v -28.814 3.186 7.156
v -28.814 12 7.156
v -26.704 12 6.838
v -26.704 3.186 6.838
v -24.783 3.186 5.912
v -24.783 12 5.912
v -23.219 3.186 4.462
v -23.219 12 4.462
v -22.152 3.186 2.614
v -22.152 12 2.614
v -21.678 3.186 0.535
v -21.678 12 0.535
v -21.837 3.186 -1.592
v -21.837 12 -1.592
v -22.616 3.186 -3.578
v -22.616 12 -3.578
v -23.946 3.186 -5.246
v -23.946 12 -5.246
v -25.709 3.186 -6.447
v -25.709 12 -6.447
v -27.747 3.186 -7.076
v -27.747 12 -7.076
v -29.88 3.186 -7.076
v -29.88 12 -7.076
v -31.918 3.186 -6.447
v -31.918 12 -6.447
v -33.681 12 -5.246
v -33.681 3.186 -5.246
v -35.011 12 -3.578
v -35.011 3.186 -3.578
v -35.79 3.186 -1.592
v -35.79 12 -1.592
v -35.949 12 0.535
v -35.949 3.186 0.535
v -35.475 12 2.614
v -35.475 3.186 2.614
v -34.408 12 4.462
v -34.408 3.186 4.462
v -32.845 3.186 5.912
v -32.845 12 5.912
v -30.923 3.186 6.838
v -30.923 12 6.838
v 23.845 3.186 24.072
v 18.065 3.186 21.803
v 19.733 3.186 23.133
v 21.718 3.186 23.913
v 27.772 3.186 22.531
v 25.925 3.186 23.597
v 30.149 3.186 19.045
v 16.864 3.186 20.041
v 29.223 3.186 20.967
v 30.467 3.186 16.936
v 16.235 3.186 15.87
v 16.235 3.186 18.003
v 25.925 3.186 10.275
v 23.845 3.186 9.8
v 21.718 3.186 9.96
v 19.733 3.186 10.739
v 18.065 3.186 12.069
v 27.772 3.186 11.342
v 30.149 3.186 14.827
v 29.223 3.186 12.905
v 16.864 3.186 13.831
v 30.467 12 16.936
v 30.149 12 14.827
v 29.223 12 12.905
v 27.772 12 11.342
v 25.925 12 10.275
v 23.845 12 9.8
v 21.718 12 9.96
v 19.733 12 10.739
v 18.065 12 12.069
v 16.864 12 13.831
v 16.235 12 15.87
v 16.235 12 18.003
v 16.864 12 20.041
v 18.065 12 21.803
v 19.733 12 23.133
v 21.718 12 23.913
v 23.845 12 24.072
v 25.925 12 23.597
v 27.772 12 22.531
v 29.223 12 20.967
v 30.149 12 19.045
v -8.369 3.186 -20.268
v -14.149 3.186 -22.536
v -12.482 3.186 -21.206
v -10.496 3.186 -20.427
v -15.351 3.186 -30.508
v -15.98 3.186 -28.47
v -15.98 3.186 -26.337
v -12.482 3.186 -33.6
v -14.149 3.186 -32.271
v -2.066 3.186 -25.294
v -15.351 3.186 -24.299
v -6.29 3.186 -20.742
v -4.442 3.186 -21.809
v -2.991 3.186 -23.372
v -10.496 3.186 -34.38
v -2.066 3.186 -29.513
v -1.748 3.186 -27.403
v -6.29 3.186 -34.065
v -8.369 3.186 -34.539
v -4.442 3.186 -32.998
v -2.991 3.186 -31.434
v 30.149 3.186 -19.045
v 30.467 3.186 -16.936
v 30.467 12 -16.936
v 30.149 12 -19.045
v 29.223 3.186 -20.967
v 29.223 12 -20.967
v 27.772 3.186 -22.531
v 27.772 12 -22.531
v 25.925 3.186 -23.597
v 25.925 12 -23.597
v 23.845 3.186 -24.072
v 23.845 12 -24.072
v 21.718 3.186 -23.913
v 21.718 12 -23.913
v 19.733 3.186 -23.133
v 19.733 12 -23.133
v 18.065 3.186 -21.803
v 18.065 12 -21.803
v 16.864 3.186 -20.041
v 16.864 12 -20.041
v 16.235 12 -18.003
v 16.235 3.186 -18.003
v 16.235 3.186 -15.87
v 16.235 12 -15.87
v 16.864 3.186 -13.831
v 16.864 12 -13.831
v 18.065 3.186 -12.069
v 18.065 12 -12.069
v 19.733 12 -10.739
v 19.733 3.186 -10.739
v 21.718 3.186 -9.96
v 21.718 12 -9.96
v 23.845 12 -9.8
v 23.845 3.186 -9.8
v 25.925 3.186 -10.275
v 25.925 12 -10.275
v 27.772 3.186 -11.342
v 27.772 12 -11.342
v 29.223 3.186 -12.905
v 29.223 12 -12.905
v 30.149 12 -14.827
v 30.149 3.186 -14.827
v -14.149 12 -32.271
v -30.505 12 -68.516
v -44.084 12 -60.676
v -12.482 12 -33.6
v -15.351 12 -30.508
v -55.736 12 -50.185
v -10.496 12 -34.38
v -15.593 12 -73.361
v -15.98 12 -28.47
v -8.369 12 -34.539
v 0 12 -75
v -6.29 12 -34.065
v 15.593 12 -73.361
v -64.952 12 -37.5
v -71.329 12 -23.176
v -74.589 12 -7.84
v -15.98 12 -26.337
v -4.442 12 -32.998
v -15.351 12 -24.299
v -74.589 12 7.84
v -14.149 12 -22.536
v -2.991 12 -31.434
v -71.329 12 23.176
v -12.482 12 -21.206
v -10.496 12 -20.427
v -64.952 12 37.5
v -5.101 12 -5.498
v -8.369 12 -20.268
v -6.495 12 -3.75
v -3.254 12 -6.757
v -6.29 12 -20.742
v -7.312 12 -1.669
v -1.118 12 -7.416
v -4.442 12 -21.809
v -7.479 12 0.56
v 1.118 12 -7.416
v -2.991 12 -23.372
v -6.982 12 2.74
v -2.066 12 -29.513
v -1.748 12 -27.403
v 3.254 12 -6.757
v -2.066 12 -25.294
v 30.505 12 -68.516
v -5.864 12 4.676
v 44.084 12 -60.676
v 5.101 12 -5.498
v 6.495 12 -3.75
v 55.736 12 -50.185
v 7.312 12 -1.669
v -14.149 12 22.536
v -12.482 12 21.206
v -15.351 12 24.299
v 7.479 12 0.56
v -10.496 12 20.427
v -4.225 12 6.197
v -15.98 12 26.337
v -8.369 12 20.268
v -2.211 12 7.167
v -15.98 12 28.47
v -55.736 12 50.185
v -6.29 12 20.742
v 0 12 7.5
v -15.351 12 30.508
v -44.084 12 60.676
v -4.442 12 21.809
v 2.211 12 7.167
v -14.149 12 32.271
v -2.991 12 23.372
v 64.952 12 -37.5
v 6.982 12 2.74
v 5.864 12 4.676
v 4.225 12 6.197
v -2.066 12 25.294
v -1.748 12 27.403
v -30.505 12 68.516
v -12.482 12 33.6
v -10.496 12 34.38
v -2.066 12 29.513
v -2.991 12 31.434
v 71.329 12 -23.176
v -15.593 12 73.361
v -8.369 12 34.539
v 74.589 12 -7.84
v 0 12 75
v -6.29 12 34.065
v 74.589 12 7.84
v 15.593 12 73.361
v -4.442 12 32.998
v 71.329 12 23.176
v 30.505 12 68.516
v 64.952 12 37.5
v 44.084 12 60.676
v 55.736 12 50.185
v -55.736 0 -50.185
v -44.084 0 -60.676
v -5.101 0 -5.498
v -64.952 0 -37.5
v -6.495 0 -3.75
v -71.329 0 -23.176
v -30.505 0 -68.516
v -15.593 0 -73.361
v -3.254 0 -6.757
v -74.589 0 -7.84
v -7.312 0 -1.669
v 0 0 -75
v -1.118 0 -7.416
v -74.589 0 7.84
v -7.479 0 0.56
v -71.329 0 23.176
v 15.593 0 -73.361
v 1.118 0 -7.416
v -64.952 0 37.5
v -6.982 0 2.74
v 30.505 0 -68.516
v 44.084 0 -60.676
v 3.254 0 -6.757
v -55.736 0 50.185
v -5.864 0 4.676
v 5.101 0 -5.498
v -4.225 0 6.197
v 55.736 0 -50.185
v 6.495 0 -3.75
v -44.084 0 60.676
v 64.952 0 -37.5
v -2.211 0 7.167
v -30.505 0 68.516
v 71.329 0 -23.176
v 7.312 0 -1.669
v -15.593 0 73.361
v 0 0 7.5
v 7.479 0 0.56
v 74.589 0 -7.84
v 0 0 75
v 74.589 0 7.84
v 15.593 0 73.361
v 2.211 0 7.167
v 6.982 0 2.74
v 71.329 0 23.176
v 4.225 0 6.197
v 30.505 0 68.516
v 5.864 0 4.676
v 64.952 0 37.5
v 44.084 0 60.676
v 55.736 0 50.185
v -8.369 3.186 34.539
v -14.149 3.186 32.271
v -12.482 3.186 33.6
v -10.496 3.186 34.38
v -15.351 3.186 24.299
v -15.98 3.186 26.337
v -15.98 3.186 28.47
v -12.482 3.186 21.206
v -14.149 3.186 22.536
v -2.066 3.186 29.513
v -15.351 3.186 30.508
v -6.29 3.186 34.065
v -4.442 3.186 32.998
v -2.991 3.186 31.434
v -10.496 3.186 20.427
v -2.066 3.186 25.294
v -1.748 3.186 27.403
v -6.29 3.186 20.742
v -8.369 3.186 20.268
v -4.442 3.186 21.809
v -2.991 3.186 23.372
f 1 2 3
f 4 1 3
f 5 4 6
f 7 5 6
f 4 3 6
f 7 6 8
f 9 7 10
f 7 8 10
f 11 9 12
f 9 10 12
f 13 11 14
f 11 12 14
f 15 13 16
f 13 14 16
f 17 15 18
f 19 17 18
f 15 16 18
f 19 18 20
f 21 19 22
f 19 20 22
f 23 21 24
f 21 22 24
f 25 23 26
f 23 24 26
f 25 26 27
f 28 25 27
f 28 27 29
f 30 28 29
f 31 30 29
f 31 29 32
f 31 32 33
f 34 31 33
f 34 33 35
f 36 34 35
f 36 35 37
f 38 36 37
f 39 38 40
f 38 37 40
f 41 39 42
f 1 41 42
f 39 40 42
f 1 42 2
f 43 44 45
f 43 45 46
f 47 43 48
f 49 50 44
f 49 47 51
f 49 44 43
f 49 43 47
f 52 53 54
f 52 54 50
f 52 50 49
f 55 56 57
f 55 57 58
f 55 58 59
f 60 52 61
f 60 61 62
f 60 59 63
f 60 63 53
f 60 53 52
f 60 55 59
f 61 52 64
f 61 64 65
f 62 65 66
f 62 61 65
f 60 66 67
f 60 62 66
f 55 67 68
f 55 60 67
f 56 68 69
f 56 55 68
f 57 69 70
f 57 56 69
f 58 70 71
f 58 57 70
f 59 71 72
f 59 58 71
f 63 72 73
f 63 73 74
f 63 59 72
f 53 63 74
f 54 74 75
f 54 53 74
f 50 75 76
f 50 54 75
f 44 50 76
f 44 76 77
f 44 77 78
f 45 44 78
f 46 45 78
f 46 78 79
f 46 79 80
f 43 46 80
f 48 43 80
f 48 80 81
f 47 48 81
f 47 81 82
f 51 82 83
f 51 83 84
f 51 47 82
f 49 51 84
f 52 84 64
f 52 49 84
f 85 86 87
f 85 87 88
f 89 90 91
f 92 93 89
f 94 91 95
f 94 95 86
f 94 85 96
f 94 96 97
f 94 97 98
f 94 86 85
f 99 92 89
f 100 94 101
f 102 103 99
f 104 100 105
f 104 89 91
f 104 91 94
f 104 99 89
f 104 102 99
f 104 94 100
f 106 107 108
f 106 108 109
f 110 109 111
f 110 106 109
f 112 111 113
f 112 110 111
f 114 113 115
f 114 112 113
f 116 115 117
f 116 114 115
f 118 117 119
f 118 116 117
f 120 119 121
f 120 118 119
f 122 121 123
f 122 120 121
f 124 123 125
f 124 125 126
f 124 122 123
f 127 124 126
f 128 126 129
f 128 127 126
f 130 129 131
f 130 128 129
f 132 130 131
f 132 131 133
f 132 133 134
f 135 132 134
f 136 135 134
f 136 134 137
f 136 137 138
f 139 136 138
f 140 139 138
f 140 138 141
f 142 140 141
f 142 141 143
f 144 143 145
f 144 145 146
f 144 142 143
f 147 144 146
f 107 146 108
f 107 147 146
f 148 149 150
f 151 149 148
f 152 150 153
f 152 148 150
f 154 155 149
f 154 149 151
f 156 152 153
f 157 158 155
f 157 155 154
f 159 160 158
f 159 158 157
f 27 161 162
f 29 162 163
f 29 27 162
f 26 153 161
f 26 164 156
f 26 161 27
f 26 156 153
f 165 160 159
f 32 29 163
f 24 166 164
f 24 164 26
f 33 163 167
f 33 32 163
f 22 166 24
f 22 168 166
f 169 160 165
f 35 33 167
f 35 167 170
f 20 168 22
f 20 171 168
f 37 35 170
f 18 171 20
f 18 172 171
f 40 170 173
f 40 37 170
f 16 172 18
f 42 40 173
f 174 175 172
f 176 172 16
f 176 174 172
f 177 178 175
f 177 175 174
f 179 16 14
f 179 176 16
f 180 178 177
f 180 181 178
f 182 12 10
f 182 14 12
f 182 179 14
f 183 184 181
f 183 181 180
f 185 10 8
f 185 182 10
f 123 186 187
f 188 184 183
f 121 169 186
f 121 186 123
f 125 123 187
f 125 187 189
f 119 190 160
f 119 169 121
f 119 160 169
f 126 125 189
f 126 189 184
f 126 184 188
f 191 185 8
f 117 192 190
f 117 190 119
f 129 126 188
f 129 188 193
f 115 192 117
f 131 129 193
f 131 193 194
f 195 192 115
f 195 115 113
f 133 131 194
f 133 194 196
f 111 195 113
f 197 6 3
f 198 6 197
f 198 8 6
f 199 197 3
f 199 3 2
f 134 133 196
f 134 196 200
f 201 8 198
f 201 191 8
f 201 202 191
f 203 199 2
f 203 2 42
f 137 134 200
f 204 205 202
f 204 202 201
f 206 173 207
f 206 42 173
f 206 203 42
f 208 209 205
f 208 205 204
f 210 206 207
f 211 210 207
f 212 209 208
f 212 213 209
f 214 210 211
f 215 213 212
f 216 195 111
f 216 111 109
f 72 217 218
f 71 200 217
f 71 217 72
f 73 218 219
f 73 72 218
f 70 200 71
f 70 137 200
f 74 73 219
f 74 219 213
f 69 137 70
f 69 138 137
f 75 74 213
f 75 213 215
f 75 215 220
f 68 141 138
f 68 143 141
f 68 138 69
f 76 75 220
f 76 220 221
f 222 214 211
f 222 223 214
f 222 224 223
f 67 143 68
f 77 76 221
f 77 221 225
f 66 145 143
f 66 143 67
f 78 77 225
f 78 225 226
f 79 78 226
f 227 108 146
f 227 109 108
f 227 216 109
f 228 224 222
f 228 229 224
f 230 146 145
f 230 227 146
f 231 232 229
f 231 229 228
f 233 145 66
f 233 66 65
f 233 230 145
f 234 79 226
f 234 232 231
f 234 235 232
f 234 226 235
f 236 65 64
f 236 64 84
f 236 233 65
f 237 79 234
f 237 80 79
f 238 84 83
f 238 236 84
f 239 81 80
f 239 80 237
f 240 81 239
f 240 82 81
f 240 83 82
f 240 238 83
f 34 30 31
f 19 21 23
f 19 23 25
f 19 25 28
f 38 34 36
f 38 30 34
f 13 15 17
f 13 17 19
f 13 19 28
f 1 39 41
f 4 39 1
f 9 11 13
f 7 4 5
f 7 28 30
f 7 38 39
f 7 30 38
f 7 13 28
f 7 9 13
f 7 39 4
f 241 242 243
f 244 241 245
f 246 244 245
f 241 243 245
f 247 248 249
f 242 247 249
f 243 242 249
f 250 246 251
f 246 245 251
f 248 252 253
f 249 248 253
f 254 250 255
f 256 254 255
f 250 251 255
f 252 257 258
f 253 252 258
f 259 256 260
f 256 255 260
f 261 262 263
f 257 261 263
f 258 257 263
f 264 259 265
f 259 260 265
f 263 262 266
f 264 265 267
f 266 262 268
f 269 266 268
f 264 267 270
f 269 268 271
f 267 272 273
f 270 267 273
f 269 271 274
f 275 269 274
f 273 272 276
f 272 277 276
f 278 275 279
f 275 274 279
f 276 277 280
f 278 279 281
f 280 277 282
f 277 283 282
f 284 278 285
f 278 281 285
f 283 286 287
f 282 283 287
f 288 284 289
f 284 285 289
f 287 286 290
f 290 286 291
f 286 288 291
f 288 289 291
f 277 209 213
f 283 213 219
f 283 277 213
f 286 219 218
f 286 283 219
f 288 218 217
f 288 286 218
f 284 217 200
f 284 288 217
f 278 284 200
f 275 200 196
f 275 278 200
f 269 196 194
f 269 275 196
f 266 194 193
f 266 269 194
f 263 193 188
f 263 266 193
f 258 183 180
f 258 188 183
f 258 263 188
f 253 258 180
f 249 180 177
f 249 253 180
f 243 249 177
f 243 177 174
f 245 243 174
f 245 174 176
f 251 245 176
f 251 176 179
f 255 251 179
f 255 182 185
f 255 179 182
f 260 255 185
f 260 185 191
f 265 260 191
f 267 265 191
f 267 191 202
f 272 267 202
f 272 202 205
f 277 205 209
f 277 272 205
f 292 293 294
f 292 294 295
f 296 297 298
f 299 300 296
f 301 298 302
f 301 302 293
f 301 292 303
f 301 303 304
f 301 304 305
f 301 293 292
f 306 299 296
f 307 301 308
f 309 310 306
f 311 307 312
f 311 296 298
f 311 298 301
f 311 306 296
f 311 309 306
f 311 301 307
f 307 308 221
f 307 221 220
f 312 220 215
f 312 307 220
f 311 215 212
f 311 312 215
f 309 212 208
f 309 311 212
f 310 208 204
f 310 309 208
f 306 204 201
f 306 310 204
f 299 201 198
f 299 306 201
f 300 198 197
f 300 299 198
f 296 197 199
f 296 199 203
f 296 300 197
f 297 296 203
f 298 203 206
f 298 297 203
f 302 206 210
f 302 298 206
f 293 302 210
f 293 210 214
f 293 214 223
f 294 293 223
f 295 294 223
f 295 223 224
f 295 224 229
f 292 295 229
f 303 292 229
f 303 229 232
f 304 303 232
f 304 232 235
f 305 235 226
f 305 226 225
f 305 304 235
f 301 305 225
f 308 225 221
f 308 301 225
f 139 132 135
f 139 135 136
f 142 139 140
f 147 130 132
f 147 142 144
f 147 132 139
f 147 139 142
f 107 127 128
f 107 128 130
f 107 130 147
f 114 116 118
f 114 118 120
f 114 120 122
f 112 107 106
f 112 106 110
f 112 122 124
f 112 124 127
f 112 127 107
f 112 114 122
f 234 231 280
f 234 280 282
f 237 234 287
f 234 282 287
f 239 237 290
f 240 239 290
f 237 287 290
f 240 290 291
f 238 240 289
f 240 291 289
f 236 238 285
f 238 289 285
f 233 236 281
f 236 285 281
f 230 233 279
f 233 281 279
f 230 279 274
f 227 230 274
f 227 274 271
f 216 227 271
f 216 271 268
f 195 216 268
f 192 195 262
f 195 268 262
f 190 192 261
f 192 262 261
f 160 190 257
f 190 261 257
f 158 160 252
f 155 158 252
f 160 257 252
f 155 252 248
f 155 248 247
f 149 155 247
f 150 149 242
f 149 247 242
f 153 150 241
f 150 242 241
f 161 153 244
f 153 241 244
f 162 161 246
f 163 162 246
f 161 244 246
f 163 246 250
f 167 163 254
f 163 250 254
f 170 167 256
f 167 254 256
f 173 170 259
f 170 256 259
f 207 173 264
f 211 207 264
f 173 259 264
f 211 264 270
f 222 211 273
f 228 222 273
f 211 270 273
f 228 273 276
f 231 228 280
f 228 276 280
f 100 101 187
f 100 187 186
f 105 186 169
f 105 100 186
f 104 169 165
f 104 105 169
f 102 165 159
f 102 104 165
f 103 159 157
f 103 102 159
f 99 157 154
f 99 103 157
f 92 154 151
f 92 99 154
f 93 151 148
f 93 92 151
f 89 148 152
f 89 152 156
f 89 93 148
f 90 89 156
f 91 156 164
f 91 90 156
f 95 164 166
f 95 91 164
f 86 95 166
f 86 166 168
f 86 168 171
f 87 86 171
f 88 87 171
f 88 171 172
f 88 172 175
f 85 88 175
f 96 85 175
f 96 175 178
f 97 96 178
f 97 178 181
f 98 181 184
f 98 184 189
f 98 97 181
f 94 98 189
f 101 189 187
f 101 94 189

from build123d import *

# Parameters (mm, degrees)
SKETCH1_R           = 75
BOSS_EXTRUDE1_DEPTH = 12
SKETCH2_R           = 7.5
CUT_EXTRUDE1_DEPTH  = 107.742681248
SKETCH3_R           = 7.155815761
CUT_EXTRUDE2_DEPTH  = 8.814392398
CIRPATTERN1_COUNT   = 5


with BuildPart() as part:
    # Sketch1 → Boss-Extrude1 (new body)
    with BuildSketch(Plane(origin=(0, 0, 0), x_dir=(1, 0, 0), z_dir=(0, 1, 0))):
        Circle(SKETCH1_R)
    extrude(amount=BOSS_EXTRUDE1_DEPTH)

    # Sketch2 → Cut-Extrude1 (cut, through all)
    with BuildSketch(Plane(origin=(0, 0, 0), x_dir=(1, 0, 0), z_dir=(0, 1, 0))):
        Circle(SKETCH2_R)
    extrude(amount=CUT_EXTRUDE1_DEPTH, mode=Mode.SUBTRACT)

    # Sketch3 → Cut-Extrude2 (cut)
    with BuildSketch(Plane(origin=(0, 12, 0), x_dir=(1, 0, 0), z_dir=(0, 1, 0))):
        with Locations((-28.813602006, 0)):
            Circle(SKETCH3_R)
    cut_extrude2 = extrude(amount=-CUT_EXTRUDE2_DEPTH, mode=Mode.SUBTRACT)

    # CirPattern1: Cut-Extrude2 ×5 about axis
    cirpattern1_axis = Axis((0, 0, 0), (0, 1, 0))
    for i in range(1, CIRPATTERN1_COUNT):
        add(cut_extrude2.rotate(cirpattern1_axis, i * 360 / CIRPATTERN1_COUNT), mode=Mode.SUBTRACT)


solid = part.part
